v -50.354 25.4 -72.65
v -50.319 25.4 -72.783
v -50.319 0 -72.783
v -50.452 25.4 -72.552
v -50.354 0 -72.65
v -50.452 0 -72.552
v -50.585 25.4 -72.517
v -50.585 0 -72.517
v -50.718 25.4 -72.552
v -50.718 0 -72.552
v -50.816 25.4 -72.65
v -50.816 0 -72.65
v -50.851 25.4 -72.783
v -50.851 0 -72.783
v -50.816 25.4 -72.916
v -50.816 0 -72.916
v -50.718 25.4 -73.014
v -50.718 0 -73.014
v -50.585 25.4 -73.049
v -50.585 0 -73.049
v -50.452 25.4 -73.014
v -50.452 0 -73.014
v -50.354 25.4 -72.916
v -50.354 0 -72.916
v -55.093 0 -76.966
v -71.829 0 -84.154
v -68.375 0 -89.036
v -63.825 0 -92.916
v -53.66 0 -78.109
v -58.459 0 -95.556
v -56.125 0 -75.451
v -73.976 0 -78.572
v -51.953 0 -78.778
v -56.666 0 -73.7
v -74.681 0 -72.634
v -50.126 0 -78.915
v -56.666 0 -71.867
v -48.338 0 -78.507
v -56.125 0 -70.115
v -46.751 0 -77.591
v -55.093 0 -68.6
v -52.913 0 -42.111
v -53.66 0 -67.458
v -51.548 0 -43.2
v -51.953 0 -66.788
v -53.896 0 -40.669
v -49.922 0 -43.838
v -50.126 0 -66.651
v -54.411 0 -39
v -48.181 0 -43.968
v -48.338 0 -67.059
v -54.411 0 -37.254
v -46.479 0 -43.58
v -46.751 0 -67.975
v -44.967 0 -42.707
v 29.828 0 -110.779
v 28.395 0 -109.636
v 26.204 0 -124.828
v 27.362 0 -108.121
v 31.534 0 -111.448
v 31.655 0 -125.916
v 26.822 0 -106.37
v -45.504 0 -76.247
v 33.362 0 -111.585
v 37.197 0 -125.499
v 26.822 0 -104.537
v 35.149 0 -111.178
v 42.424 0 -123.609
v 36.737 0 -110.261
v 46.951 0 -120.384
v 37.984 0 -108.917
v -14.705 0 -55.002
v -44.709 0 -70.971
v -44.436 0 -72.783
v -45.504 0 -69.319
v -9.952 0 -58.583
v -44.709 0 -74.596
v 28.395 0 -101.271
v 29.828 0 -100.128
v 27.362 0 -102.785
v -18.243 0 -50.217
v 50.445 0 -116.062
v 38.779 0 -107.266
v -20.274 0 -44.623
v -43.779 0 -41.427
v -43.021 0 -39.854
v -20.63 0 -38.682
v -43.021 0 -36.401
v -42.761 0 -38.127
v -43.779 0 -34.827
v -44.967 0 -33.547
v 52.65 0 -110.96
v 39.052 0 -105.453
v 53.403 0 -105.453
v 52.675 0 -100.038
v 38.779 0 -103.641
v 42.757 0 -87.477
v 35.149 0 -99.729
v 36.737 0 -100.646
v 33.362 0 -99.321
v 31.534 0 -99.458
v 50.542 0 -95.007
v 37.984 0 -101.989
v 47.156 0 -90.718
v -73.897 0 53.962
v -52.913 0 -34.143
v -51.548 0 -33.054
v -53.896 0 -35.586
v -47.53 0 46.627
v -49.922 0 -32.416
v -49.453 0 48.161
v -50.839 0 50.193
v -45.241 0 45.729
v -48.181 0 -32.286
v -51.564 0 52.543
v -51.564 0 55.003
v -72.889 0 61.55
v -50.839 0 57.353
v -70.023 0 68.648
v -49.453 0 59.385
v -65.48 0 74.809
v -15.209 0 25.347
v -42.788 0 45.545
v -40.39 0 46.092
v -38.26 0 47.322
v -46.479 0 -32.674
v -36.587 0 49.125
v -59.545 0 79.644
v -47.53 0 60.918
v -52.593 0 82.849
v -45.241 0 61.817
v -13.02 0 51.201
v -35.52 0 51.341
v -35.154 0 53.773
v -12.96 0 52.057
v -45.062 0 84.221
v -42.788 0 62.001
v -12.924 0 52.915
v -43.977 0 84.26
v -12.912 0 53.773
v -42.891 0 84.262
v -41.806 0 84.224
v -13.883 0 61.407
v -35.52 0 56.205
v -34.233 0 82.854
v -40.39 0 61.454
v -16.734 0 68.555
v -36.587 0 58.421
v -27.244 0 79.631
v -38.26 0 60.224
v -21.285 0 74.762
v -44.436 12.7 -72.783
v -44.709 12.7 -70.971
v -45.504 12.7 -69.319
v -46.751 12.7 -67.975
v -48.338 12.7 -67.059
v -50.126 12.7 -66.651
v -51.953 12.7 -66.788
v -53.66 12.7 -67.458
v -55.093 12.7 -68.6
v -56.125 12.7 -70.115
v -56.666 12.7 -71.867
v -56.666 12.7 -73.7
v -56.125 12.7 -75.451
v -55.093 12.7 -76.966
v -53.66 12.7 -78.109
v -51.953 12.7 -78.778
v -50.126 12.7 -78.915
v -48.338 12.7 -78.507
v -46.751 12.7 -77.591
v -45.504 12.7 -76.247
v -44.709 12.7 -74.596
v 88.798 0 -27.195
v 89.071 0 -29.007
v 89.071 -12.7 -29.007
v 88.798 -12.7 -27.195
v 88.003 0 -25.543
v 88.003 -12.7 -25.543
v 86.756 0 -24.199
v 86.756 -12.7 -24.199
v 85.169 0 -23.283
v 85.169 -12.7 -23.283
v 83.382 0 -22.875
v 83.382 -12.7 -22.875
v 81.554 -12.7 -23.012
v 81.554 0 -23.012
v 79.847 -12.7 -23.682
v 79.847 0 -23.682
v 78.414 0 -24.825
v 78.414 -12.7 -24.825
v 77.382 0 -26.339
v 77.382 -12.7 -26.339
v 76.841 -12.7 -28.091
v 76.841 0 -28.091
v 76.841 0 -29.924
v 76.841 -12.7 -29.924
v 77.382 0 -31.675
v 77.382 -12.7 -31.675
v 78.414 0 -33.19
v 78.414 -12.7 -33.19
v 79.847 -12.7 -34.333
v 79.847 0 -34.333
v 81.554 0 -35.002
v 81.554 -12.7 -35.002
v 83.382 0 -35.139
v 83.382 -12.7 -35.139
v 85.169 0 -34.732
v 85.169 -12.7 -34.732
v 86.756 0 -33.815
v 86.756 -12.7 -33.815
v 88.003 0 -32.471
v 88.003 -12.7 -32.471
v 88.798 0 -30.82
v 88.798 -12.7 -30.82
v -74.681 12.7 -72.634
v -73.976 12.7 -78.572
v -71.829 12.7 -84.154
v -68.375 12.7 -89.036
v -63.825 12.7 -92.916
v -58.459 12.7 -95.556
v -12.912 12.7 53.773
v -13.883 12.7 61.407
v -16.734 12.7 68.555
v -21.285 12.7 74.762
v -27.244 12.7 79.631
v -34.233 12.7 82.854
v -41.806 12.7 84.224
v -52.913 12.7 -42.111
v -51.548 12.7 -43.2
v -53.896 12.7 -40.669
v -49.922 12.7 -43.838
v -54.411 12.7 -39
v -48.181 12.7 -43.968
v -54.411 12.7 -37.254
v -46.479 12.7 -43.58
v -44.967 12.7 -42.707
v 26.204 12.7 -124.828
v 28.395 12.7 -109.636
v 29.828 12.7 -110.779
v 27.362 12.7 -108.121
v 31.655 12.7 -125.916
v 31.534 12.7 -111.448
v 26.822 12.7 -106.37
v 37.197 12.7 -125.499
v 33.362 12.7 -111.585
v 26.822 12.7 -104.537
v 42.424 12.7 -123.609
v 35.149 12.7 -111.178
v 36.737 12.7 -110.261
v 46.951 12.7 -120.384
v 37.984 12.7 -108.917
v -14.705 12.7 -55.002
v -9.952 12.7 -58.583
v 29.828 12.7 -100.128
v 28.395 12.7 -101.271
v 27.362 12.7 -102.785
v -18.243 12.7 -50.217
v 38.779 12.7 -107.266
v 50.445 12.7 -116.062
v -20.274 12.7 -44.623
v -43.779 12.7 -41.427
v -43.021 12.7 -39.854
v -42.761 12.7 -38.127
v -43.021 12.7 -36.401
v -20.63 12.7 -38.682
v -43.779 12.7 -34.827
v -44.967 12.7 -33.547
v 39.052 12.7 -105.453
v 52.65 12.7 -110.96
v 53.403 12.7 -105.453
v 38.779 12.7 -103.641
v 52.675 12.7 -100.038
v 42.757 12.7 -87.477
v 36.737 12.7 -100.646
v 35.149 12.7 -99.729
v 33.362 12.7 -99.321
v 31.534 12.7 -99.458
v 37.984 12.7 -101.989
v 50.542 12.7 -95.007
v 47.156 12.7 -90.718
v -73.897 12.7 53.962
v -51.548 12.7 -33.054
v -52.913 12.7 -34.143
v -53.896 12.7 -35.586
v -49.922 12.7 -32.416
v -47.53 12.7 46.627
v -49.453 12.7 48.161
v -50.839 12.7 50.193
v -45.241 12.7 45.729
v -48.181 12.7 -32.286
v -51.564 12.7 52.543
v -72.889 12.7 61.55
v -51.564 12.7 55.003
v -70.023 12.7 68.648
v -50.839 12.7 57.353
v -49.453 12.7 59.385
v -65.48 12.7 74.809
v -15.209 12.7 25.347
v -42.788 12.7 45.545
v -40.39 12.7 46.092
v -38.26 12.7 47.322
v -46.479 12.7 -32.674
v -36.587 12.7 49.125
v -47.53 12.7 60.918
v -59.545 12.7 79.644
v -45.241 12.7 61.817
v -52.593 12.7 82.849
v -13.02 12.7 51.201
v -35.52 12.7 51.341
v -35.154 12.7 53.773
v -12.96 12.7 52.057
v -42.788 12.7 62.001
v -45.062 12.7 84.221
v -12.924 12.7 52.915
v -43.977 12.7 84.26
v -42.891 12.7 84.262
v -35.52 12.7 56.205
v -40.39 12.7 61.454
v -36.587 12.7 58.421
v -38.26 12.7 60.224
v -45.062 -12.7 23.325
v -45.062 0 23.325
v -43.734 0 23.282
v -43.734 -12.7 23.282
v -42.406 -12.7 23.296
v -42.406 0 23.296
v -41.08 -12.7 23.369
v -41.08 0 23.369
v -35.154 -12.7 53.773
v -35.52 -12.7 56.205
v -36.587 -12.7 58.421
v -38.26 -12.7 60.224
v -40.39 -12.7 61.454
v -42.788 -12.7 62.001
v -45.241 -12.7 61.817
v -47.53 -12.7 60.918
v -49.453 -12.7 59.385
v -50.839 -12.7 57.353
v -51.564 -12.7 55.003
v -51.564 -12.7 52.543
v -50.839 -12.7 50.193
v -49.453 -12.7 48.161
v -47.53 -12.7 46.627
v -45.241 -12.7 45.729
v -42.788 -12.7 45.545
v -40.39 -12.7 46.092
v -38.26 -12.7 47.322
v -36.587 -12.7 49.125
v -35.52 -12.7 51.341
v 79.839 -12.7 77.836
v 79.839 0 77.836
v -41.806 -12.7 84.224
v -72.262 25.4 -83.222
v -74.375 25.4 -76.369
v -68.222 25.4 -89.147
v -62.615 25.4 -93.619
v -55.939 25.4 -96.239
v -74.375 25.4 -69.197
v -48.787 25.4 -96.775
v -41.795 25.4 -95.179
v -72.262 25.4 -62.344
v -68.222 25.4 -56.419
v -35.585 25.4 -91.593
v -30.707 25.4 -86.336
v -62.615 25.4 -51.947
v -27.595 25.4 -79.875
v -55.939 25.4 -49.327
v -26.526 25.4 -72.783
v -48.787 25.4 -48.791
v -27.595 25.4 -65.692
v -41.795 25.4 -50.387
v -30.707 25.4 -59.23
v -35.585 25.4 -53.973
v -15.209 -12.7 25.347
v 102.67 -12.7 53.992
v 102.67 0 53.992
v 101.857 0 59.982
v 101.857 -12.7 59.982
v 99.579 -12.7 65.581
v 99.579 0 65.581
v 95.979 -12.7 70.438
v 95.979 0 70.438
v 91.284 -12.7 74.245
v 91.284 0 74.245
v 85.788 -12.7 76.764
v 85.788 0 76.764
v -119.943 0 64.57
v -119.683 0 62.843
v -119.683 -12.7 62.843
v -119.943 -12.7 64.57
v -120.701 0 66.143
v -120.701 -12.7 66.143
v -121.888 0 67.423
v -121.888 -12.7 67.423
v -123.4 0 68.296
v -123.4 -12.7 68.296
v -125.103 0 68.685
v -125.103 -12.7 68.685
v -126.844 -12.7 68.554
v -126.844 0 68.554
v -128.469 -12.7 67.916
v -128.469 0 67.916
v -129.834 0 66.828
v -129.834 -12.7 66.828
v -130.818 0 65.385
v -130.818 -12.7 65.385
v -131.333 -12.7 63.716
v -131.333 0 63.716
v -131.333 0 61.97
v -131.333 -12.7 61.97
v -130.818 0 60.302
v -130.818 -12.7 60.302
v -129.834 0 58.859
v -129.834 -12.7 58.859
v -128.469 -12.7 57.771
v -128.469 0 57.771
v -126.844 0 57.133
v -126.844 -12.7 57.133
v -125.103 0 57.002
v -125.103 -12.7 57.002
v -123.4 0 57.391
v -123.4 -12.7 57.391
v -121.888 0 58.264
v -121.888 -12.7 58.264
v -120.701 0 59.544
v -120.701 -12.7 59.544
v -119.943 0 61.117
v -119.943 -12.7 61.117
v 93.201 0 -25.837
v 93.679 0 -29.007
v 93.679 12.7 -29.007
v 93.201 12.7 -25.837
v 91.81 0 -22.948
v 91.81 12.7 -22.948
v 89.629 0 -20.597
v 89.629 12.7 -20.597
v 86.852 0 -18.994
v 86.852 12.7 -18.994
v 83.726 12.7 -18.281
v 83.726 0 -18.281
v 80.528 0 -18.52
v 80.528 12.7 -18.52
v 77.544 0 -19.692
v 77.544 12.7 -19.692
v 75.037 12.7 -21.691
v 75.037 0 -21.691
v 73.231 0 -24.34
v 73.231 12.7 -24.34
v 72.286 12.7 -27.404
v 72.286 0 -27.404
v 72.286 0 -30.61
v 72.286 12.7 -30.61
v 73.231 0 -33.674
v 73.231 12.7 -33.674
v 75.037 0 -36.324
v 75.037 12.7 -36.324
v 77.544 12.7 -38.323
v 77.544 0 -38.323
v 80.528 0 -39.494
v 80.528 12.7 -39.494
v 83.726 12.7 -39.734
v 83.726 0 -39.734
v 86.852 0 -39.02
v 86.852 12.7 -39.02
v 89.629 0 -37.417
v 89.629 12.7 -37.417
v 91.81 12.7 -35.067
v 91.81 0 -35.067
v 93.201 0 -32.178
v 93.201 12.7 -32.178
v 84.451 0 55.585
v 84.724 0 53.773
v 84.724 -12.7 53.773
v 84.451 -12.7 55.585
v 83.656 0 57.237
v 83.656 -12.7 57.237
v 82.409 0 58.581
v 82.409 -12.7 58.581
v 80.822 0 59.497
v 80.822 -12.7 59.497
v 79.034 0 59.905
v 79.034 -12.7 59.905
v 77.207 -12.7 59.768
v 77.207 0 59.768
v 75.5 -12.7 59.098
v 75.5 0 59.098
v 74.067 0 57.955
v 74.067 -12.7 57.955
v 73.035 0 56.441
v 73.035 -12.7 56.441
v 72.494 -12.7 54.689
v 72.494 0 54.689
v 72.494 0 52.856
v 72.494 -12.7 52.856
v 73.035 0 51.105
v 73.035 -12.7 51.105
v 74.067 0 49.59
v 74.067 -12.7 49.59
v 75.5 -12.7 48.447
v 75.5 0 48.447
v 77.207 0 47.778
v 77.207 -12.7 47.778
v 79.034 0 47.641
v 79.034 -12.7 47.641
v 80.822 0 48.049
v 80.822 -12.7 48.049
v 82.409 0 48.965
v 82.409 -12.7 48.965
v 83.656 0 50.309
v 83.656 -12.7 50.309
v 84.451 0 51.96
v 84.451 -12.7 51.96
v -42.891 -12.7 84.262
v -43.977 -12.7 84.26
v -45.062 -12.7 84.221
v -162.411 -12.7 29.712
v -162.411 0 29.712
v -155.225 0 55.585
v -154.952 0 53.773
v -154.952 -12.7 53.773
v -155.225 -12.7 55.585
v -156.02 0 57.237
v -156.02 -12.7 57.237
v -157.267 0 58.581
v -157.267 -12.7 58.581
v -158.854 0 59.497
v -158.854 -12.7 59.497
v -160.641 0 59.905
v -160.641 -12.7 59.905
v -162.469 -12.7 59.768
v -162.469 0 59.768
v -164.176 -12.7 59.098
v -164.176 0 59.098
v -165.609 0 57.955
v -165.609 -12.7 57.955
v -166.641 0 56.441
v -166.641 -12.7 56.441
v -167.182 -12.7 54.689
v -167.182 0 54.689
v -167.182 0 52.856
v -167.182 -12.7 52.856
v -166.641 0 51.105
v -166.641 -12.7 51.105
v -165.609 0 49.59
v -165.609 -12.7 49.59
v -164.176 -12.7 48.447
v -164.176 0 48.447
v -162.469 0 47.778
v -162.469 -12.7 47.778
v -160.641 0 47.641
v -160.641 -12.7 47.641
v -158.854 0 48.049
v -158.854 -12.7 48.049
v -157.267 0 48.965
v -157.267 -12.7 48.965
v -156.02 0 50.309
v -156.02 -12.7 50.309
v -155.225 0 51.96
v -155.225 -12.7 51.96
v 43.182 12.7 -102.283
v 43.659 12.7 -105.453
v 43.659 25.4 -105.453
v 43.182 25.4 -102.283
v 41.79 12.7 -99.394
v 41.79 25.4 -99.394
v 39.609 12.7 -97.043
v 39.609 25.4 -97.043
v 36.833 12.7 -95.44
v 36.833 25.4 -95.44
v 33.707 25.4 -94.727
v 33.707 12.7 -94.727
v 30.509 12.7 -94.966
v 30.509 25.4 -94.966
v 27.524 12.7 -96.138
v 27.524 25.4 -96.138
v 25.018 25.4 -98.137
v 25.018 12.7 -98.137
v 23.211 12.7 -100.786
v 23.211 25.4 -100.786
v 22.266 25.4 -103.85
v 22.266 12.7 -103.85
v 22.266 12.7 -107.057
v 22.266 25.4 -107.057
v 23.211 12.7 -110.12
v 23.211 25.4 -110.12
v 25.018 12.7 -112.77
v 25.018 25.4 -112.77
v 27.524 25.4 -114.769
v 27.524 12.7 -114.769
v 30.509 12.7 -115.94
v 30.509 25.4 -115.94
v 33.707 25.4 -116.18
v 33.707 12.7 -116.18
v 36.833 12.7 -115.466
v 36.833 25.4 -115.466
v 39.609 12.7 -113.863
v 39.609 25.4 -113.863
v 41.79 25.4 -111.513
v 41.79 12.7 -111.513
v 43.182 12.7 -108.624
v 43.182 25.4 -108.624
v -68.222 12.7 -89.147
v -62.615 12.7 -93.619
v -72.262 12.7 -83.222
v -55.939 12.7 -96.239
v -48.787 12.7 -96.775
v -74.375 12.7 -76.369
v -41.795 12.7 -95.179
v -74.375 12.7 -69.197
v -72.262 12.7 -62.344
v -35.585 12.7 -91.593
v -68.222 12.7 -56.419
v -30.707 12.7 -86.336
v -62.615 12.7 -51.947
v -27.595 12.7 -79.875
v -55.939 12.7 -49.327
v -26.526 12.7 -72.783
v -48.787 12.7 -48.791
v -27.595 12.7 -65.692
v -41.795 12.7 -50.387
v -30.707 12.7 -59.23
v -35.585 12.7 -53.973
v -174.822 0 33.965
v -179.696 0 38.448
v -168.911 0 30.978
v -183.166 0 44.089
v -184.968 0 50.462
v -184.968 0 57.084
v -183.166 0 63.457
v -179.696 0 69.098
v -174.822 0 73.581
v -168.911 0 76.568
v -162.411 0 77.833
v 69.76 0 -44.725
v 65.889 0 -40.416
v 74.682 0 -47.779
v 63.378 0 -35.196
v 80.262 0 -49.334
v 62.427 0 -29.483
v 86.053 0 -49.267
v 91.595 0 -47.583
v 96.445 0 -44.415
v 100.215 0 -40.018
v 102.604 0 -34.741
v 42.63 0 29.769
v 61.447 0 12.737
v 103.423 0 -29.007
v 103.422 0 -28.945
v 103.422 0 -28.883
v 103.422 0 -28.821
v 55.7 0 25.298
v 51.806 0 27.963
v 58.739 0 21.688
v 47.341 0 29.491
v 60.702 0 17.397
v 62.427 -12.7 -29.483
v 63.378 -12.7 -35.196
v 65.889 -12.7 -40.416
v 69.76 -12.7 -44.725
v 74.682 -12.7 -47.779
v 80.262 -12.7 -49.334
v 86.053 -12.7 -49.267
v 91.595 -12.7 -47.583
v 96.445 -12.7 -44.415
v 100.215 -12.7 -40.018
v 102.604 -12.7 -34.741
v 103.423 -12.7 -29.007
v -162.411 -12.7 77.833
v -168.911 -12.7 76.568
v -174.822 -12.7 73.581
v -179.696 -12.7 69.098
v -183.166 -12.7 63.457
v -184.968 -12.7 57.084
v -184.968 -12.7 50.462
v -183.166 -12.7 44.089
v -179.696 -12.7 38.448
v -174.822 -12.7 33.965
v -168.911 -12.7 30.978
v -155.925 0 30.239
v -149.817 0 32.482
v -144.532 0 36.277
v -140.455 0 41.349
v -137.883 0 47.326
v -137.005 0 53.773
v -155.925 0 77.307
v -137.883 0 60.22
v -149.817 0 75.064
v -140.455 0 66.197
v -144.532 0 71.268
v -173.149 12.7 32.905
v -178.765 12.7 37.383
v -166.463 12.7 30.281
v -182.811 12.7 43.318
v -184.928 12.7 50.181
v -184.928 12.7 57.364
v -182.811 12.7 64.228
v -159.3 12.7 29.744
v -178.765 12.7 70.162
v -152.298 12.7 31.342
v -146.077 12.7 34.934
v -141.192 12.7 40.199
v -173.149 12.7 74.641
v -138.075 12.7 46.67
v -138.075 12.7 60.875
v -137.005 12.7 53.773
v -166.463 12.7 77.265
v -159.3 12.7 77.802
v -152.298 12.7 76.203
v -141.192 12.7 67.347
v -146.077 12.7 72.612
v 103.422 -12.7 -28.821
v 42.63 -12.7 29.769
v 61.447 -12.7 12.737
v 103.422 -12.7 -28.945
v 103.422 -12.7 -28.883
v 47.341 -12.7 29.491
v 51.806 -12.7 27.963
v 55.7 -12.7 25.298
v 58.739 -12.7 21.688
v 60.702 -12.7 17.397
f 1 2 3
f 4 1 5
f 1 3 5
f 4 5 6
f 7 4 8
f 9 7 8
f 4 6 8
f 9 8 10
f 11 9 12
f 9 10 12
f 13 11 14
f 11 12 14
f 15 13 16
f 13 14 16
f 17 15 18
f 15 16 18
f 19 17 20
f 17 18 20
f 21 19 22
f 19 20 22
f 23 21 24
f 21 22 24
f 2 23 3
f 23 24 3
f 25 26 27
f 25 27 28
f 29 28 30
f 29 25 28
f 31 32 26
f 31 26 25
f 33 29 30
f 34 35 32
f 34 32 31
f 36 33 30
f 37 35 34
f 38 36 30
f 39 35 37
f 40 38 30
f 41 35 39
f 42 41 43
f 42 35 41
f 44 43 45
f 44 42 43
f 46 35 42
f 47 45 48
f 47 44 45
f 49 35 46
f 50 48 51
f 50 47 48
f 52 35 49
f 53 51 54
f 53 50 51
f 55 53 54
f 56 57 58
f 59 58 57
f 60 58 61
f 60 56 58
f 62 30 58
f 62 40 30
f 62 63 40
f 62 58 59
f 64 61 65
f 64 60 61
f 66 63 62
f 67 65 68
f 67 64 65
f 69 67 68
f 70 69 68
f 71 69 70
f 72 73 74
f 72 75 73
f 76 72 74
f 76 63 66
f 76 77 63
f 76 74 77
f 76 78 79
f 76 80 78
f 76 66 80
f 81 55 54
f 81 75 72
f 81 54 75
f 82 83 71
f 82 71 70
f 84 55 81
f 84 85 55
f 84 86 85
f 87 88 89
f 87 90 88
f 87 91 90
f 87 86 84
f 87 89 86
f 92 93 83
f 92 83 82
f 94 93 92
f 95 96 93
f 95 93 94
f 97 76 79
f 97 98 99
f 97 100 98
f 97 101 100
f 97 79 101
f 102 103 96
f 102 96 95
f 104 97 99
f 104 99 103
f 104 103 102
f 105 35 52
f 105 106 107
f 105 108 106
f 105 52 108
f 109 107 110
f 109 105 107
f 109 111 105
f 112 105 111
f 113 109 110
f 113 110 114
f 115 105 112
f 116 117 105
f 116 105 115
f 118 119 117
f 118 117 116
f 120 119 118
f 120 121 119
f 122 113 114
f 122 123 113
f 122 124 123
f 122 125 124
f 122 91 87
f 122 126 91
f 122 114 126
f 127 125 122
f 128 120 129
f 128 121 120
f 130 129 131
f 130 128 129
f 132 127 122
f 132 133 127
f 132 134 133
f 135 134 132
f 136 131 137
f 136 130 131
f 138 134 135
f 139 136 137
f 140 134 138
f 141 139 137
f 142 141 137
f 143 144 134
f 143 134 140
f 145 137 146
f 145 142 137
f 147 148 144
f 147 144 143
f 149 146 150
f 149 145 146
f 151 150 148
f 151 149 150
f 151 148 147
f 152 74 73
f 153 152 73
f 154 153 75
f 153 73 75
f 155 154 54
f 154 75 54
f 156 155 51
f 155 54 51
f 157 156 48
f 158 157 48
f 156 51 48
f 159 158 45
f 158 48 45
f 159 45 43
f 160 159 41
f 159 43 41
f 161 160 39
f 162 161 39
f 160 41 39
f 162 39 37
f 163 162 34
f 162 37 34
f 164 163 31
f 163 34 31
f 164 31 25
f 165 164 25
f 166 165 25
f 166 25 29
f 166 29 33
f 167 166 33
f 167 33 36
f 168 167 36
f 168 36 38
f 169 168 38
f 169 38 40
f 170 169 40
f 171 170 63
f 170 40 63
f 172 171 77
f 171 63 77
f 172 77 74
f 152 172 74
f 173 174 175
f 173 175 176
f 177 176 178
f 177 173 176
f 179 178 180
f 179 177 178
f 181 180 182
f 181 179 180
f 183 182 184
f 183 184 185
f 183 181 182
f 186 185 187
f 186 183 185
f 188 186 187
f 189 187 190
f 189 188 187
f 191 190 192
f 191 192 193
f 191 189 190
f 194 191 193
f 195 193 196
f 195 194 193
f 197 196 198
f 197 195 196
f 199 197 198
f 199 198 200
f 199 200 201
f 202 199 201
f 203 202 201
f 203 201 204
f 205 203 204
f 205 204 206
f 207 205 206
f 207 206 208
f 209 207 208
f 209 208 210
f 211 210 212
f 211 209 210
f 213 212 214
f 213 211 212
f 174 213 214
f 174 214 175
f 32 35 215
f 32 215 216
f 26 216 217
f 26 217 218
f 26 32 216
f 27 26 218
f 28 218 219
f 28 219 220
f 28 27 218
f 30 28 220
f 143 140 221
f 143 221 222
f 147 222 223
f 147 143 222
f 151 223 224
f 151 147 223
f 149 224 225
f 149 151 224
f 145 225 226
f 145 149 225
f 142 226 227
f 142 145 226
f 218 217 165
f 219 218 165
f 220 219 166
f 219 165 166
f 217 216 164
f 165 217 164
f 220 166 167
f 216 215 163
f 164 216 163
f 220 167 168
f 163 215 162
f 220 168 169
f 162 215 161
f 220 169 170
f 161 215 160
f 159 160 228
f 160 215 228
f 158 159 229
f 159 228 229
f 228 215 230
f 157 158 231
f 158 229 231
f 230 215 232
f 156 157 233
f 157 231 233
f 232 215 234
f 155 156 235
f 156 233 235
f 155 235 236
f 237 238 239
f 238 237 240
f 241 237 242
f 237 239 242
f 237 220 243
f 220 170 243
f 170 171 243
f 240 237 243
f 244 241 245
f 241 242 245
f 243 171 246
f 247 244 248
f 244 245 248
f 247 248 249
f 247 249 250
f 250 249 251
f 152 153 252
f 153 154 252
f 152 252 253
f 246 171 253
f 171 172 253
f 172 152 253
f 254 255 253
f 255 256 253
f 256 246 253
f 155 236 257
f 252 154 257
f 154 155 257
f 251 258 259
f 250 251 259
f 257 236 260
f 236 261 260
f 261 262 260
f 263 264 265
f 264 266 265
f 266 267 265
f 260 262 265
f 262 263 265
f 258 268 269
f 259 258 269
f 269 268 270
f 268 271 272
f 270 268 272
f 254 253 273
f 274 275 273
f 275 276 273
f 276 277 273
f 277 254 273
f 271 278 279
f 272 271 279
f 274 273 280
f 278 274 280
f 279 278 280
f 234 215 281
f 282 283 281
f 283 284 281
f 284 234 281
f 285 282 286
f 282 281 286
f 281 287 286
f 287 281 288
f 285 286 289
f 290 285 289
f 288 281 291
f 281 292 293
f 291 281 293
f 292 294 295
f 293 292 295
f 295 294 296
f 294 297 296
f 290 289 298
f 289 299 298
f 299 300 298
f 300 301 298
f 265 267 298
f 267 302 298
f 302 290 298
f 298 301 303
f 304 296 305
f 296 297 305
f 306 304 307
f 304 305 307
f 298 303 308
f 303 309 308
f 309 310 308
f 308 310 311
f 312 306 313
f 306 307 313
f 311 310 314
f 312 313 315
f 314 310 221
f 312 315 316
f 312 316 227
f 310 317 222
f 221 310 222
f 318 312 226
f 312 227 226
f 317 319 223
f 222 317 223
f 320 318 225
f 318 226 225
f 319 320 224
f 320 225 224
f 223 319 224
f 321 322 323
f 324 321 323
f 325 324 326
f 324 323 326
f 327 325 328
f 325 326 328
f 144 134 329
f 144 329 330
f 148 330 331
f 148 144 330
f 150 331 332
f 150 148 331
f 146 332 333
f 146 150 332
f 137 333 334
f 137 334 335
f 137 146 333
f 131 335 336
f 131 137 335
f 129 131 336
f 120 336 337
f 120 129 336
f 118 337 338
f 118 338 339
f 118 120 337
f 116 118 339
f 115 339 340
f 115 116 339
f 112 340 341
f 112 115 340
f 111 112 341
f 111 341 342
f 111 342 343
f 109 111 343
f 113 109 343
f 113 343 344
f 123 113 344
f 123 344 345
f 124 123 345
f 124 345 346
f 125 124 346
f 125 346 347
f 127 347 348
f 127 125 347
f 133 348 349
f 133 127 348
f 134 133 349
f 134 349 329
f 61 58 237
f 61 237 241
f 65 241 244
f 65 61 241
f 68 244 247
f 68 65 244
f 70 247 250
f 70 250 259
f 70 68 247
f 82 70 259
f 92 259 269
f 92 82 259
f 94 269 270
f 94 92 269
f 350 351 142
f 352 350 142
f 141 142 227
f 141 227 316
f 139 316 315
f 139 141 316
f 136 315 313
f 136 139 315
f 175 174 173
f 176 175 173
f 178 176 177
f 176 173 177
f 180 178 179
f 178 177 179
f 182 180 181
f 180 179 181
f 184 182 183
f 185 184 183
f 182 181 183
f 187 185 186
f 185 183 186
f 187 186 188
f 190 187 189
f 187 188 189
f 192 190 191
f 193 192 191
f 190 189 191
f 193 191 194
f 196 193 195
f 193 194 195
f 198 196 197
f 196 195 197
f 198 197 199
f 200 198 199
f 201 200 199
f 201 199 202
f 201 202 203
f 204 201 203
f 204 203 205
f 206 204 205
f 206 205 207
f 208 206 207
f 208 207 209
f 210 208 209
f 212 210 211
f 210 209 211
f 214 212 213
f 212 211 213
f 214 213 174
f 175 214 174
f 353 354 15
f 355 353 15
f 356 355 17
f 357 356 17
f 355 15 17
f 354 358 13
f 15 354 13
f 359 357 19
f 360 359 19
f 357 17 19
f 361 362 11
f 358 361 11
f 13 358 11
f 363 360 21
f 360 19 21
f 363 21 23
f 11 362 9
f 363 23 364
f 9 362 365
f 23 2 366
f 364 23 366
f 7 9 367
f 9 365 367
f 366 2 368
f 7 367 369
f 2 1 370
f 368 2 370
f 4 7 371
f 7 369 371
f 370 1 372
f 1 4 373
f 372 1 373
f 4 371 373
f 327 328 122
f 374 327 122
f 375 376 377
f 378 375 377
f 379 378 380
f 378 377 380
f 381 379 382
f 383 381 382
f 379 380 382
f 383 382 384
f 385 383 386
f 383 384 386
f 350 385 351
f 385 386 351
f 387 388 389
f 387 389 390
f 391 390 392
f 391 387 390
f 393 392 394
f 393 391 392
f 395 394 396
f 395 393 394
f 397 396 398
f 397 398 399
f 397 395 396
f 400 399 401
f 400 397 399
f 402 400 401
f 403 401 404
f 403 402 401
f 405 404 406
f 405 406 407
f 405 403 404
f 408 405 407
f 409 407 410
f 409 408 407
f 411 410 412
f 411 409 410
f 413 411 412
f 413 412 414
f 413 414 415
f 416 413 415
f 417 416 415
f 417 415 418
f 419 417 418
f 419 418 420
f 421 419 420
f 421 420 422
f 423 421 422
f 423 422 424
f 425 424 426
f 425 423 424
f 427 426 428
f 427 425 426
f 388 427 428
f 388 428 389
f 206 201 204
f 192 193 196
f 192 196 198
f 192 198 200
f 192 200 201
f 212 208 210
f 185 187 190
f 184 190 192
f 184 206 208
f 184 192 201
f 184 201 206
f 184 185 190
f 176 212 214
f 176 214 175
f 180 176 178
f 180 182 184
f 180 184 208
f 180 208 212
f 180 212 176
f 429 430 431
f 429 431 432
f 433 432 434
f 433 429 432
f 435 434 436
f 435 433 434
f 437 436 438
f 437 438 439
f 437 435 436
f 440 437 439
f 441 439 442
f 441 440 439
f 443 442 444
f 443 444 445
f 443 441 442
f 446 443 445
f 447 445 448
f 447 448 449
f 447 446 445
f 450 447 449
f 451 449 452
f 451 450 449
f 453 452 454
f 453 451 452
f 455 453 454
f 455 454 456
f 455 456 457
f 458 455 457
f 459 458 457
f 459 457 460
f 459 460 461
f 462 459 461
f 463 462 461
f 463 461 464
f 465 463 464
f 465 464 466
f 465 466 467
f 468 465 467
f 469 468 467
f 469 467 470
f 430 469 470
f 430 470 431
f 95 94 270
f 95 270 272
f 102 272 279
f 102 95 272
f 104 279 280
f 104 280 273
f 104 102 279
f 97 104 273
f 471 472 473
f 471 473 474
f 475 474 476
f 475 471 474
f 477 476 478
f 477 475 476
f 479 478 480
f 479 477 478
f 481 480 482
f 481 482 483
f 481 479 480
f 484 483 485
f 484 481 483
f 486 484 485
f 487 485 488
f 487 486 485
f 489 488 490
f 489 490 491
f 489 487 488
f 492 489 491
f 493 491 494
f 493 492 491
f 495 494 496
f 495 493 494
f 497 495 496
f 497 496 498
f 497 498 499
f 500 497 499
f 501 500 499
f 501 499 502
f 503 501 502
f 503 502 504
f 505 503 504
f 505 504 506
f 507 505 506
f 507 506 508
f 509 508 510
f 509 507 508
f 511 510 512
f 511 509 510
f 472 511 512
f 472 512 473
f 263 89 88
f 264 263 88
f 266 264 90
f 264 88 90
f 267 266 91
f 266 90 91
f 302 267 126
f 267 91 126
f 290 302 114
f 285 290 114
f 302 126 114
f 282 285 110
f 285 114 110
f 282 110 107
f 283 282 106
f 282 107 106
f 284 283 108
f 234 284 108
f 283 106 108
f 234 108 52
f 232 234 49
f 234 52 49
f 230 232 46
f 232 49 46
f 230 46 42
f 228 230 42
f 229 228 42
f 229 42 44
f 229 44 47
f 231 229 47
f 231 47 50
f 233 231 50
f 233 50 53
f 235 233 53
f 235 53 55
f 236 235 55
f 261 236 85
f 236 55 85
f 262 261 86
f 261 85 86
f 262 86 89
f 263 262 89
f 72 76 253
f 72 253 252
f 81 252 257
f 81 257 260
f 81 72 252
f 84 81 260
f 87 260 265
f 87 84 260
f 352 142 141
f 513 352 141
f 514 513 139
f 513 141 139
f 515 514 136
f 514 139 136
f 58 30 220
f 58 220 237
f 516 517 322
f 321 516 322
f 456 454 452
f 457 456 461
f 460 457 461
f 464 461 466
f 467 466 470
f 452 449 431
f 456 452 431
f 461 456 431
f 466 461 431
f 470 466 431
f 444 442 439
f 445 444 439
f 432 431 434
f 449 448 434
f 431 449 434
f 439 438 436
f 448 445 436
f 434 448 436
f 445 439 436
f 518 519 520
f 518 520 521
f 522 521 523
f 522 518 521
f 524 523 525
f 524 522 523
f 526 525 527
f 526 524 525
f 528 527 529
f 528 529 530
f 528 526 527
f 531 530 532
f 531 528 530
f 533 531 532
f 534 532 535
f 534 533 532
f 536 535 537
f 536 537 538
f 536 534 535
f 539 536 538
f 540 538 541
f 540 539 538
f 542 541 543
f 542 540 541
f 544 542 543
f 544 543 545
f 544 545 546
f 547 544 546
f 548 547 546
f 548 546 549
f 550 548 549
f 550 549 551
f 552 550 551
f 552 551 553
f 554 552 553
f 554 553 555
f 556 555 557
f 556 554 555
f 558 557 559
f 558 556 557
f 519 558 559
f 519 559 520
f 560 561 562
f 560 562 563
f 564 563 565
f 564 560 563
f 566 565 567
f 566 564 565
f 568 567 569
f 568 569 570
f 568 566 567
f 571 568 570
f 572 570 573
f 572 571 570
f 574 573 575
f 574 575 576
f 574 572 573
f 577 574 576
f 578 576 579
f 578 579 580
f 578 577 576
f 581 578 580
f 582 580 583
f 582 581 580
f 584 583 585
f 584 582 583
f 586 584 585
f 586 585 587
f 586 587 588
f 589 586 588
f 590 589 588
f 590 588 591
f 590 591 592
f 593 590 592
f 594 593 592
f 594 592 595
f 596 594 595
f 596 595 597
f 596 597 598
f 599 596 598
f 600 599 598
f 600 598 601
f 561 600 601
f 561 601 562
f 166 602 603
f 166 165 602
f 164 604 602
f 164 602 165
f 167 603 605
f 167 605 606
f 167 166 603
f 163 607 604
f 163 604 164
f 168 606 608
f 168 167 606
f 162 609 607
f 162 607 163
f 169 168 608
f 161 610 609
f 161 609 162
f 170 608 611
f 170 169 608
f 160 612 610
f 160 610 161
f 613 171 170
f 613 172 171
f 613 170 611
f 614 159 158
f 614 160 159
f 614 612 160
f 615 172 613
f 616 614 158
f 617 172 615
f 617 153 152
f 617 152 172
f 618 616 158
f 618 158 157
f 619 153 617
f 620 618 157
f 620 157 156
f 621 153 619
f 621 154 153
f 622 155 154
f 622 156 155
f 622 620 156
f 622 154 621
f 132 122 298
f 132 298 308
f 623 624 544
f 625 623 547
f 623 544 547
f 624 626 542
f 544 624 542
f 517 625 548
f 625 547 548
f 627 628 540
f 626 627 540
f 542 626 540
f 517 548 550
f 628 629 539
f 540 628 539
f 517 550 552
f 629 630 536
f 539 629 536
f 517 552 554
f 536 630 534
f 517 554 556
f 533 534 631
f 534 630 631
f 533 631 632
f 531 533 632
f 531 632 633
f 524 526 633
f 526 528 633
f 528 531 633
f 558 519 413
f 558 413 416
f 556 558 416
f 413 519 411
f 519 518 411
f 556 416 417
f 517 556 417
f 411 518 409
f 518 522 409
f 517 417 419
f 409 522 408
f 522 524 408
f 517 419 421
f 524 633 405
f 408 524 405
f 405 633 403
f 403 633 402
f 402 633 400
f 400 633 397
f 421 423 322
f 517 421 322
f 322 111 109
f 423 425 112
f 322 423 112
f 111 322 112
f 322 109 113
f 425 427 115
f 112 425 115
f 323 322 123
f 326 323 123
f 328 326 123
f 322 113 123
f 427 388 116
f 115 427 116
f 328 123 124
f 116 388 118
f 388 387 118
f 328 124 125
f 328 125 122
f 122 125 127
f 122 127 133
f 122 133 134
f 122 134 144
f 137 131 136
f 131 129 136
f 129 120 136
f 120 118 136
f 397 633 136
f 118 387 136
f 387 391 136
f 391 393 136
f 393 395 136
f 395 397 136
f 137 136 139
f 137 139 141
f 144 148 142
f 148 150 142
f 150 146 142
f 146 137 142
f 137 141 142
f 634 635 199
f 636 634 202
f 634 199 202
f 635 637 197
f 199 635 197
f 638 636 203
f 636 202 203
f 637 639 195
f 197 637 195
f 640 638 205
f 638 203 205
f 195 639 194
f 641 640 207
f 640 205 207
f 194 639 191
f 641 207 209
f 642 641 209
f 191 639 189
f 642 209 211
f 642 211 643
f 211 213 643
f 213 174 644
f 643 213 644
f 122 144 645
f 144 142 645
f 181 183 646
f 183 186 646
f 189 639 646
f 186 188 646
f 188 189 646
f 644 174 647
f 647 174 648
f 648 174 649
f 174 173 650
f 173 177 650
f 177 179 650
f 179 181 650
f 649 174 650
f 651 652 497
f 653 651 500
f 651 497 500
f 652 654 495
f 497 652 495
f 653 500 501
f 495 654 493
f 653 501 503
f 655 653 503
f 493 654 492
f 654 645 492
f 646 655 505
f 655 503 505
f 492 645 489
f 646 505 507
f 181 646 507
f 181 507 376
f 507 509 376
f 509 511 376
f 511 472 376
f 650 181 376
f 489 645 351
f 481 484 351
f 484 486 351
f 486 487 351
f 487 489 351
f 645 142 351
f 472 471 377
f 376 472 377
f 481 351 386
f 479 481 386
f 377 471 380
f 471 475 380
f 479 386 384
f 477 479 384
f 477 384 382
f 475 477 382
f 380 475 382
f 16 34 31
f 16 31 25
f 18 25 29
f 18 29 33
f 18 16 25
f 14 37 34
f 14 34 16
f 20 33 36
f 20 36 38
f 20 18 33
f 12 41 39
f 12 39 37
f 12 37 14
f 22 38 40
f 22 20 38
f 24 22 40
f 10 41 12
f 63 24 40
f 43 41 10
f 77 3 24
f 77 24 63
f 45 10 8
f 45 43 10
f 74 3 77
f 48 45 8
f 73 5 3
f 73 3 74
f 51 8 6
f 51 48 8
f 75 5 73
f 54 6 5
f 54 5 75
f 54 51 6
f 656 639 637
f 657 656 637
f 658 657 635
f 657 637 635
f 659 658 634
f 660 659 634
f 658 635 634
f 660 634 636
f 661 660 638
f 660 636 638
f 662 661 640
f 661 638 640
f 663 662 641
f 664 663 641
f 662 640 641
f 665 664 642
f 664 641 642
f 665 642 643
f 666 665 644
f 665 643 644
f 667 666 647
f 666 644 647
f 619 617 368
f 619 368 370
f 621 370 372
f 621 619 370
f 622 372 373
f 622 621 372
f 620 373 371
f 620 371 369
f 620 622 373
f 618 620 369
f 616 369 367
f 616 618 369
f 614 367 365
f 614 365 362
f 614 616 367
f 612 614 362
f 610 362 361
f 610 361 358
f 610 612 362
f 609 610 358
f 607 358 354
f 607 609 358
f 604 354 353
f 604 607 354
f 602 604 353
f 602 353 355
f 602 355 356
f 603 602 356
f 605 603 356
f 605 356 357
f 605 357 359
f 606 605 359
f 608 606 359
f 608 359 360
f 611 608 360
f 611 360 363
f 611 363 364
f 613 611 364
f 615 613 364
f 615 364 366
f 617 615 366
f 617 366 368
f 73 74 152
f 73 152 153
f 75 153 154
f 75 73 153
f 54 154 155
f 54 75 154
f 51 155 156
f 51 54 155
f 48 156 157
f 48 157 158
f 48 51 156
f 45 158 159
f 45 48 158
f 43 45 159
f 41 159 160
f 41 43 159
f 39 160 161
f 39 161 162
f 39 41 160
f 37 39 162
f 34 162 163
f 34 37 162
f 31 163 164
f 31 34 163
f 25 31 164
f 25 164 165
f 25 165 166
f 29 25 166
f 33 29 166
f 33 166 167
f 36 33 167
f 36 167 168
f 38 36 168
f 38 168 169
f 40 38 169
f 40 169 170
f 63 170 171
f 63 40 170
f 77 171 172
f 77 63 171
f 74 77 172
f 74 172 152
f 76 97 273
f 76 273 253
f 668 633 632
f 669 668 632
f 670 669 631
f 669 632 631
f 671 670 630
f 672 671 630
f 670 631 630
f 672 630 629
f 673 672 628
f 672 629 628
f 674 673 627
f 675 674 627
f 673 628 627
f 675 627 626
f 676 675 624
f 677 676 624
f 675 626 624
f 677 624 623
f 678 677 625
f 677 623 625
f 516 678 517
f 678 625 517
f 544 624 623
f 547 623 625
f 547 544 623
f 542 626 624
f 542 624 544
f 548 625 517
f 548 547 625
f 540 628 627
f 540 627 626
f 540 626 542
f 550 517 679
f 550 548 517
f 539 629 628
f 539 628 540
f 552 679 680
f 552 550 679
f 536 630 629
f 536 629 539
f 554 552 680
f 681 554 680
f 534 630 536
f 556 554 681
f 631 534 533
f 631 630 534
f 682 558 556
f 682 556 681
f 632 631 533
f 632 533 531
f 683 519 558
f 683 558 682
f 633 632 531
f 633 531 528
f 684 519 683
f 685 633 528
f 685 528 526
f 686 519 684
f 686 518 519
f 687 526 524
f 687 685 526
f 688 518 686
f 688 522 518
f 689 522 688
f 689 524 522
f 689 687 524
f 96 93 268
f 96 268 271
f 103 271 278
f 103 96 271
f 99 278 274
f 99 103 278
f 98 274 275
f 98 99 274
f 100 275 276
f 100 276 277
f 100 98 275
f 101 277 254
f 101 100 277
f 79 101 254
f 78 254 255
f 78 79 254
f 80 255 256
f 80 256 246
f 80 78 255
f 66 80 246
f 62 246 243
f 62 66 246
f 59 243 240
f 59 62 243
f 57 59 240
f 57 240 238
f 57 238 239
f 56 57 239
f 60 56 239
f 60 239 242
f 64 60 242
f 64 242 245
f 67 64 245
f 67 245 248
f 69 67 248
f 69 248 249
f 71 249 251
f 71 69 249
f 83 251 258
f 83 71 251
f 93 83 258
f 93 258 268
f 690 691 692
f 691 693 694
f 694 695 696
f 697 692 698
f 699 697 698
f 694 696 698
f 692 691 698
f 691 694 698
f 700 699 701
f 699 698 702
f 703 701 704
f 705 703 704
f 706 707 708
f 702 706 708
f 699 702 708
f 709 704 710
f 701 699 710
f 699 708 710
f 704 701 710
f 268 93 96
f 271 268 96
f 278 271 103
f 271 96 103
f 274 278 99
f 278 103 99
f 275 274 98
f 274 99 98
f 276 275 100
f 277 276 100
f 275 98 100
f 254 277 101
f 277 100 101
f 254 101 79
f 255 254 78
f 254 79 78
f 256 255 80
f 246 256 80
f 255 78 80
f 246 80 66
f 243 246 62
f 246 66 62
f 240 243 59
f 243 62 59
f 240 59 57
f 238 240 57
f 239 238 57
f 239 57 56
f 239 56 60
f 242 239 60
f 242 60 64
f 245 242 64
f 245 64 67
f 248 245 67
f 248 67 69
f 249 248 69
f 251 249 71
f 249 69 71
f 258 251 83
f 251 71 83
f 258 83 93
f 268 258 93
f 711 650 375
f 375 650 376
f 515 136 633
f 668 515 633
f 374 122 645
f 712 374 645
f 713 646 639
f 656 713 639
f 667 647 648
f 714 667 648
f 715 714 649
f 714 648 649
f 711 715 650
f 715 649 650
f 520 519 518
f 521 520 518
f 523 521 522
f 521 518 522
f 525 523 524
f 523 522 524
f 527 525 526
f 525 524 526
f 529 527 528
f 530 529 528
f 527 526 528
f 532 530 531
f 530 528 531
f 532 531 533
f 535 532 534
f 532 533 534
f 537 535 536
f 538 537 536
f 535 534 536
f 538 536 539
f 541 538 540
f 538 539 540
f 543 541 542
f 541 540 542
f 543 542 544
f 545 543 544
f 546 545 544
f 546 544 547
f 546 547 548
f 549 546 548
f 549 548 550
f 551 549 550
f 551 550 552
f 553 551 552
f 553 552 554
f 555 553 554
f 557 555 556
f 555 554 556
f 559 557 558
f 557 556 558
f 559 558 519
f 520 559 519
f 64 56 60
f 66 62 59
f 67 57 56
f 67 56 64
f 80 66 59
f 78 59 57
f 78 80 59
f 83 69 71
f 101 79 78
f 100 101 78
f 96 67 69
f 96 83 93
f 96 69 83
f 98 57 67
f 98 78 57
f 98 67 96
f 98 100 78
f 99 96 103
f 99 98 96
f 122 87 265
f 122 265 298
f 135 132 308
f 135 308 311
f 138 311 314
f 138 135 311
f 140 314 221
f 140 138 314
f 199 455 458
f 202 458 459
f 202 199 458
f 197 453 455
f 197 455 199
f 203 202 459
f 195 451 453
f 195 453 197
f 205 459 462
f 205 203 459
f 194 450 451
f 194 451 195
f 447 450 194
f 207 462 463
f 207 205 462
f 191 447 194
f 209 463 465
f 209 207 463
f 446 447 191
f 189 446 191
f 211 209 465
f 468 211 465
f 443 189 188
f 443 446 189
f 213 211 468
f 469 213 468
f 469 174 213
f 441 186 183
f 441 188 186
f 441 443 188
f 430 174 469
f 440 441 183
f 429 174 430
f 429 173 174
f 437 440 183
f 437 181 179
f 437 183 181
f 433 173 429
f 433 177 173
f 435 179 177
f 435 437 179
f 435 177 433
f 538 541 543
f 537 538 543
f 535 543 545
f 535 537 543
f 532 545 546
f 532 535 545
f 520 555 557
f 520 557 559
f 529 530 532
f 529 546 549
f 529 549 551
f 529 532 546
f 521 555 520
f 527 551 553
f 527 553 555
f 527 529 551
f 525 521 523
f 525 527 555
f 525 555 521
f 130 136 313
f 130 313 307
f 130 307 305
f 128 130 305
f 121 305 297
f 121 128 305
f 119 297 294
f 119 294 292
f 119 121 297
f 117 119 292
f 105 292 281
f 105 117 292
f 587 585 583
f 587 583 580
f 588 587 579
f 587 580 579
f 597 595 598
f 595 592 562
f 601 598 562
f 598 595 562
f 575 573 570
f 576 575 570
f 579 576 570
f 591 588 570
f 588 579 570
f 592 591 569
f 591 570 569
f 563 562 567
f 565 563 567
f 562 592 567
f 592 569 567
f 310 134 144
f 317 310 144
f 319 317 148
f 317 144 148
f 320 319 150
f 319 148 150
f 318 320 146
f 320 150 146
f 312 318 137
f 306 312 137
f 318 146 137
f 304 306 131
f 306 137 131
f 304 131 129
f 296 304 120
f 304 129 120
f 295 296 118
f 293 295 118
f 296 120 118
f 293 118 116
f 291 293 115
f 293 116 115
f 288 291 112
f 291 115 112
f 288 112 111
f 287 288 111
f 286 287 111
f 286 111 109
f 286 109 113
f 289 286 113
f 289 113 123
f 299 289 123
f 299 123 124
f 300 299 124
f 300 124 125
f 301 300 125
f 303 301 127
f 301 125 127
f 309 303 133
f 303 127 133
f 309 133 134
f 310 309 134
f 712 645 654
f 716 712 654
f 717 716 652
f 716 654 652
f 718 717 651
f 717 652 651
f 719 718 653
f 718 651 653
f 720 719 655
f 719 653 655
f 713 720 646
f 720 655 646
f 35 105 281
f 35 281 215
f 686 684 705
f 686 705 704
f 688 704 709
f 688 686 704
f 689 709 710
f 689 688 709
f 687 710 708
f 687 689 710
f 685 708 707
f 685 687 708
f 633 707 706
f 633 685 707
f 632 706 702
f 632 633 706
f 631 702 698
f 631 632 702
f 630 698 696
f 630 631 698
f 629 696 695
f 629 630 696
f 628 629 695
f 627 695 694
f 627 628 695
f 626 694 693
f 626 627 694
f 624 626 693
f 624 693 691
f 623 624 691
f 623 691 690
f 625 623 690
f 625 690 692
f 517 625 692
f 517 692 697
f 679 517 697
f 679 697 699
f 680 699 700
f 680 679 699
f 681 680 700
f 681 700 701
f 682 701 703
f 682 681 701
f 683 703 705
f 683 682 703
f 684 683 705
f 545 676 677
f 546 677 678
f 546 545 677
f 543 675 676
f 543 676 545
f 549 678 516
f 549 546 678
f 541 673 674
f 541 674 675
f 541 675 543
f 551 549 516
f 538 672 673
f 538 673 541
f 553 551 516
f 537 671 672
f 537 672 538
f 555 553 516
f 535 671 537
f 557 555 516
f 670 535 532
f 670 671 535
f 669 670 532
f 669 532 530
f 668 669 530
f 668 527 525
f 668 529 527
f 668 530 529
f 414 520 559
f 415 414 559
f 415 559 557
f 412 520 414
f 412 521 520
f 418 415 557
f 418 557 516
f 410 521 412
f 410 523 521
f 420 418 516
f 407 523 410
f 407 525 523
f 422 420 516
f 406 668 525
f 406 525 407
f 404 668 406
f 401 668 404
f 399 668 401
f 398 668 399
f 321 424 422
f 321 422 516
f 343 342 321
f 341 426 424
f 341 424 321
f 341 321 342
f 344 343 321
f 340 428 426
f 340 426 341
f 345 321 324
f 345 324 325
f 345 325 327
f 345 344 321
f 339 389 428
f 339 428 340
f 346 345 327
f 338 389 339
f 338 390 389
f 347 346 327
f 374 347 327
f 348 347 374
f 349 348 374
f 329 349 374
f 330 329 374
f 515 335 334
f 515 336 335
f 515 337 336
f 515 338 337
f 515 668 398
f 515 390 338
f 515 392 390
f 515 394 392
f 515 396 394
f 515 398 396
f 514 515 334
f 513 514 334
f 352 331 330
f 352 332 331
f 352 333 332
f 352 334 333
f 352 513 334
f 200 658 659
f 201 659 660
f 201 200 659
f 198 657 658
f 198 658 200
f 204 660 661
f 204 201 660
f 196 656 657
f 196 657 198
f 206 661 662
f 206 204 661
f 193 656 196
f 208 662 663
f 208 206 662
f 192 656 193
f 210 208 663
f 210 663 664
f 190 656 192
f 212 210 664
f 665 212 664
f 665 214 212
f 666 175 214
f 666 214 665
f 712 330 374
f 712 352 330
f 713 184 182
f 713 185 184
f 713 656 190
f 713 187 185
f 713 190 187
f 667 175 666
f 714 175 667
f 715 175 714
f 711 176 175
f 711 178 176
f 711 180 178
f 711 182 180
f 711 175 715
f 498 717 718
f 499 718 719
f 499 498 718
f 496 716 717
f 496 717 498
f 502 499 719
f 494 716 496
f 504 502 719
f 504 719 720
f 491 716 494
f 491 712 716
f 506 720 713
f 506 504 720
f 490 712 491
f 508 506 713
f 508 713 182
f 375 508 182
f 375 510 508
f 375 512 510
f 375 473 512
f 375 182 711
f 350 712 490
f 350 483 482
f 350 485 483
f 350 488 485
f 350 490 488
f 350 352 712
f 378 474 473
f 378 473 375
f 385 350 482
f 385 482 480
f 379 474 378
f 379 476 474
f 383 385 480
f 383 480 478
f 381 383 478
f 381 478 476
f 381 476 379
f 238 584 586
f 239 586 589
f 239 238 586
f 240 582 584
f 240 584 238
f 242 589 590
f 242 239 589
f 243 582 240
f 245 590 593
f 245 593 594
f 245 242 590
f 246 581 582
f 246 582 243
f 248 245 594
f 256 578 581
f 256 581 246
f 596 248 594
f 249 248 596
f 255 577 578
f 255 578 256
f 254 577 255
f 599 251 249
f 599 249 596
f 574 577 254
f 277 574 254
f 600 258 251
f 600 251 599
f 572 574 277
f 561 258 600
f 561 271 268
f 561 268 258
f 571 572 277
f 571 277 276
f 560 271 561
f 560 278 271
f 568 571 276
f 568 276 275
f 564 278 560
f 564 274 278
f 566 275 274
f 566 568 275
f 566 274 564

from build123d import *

# Parameters (mm, degrees)
F0_R     = 6.1493367897
F0_R_2   = 5.8576786547
F0_R_3   = 8.2510252631
F1_DEPTH = 12.7
F2_DEPTH = 12.7
F3_R     = 10.7566179169
F5_DEPTH = 25.4
F3_R_2   = 24.0961882632
F4_R     = 24.0590637796
F4_R_2   = 0.2663452523
F4_R_3   = 10.7566179169


with BuildPart() as f1:
    # F0 (on Front) → F1 (new body)
    with BuildSketch(Plane.XZ):
        with BuildLine():
            ThreePointArc((-137.004724496, 53.7728478672), (-144.5318286506, 71.2683255862), (-162.4105469667, 77.8334203262))
            ThreePointArc((-162.4105469667, 77.8334203262), (-185.1971010223, 53.7728478672), (-162.4105469667, 29.7122754082))
            ThreePointArc((-162.4105469667, 29.7122754082), (-144.5318286506, 36.2773701482), (-137.004724496, 53.7728478672))
        make_face()
        with Locations((-161.1009127591, 53.7728478672)):
            Circle(F0_R, mode=Mode.SUBTRACT)
        with BuildLine():
            ThreePointArc((-73.8970993097, 53.9616213386), (-65.4796718147, 74.8089623918), (-45.0619767979, 84.2207871257))
            Line((-45.0619767979, 84.2207871257), (-162.4105469667, 77.8334203262))
            ThreePointArc((-162.4105469667, 77.8334203262), (-144.5318286506, 71.2683255862), (-137.004724496, 53.7728478672))
            ThreePointArc((-137.004724496, 53.7728478672), (-144.5318286506, 36.2773701482), (-162.4105469667, 29.7122754082))
            Line((-162.4105469667, 29.7122754082), (-74.0769888087, 24.9042165128))
            Line((-74.0769888087, 24.9042165128), (-73.8970993097, 53.9616213386))
        make_face()
        with Locations((-125.5404559068, 62.8434497782)):
            Circle(F0_R_2, mode=Mode.SUBTRACT)
        with BuildLine():
            ThreePointArc((-45.0619767979, 23.3249086087), (-65.6094773456, 32.873796427), (-73.8970993097, 53.9616213386))
            Line((-73.8970993097, 53.9616213386), (-74.0769888087, 24.9042165128))
            Line((-74.0769888087, 24.9042165128), (-45.0619767979, 23.3249086087))
        make_face()
        with BuildLine():
            ThreePointArc((-13.0203492827, 51.2005935197), (-12.9388471647, 52.4855731298), (-12.9116636365, 53.7728478672))
            ThreePointArc((-12.9116636365, 53.7728478672), (-21.2847140662, 74.7616793609), (-41.8055673522, 84.2238990469))
            ThreePointArc((-41.8055673522, 84.2238990469), (-43.4338136458, 84.2658439437), (-45.0619767979, 84.2207871257))
            ThreePointArc((-45.0619767979, 84.2207871257), (-65.4796718147, 74.8089623918), (-73.8970993097, 53.9616213386))
            ThreePointArc((-73.8970993097, 53.9616213386), (-65.6094773456, 32.873796427), (-45.0619767979, 23.3249086087))
            ThreePointArc((-45.0619767979, 23.3249086087), (-43.0702384678, 23.2816718981), (-41.0799276521, 23.368584762))
            ThreePointArc((-41.0799276521, 23.368584762), (-21.9308291165, 32.1234215378), (-13.0203492827, 51.2005935197))
        make_face()
        with Locations((-43.4046736365, 53.7728478672)):
            Circle(F0_R_3, mode=Mode.SUBTRACT)
        with BuildLine():
            Line((-15.2090695609, 25.3467012272), (-13.0203492827, 51.2005935197))
            ThreePointArc((-13.0203492827, 51.2005935197), (-21.9308291165, 32.1234215378), (-41.0799276521, 23.368584762))
            Line((-41.0799276521, 23.368584762), (-15.2090695609, 25.3467012272))
        make_face()
        with BuildLine():
            ThreePointArc((-41.8055673522, 84.2238990469), (-21.2847140662, 74.7616793609), (-12.9116636365, 53.7728478672))
            ThreePointArc((-12.9116636365, 53.7728478672), (-12.9388471647, 52.4855731298), (-13.0203492827, 51.2005935197))
            Line((-13.0203492827, 51.2005935197), (-15.2090695609, 25.3467012272))
            Line((-15.2090695609, 25.3467012272), (42.6304365589, 29.7691784017))
            ThreePointArc((42.6304365589, 29.7691784017), (55.6995392523, 25.2975780046), (61.447394796, 12.7373705236))
            Line((61.447394796, 12.7373705236), (62.4270150936, -29.4827839898))
            ThreePointArc((62.4270150936, -29.4827839898), (82.5912356818, -8.509370566), (103.4217411847, -28.8211873993))
            Line((103.4217411847, -28.8211873993), (102.6701248935, 53.9915381907))
            ThreePointArc((102.6701248935, 53.9915381907), (102.6708691973, 53.8821941548), (102.6711173003, 53.7728478672))
            ThreePointArc((102.6711173003, 53.7728478672), (61.0952932065, 37.1870521358), (79.8385749048, 77.8358794288))
            Line((79.8385749048, 77.8358794288), (-41.8055673522, 84.2238990469))
        make_face()
        with BuildLine():
            ThreePointArc((102.6701248935, 53.9915381907), (95.9791200745, 70.4377938061), (79.8385749048, 77.8358794288))
            ThreePointArc((79.8385749048, 77.8358794288), (61.0952932065, 37.1870521358), (102.6711173003, 53.7728478672))
            ThreePointArc((102.6711173003, 53.7728478672), (102.6708691973, 53.8821941548), (102.6701248935, 53.9915381907))
        make_face()
        with Locations((78.5749290371, 53.7728478672)):
            Circle(F0_R, mode=Mode.SUBTRACT)
        with BuildLine():
            ThreePointArc((103.4225855041, -29.0072446459), (103.4223744232, -28.9142150647), (103.4217411847, -28.8211873993))
            ThreePointArc((103.4217411847, -28.8211873993), (82.5912356818, -8.509370566), (62.4270150936, -29.4827839898))
            ThreePointArc((62.4270150936, -29.4827839898), (83.1598278924, -49.506408842), (103.4225855041, -29.0072446459))
        make_face()
        with Locations((82.9220422244, -29.0072446459)):
            Circle(F0_R, mode=Mode.SUBTRACT)
    extrude(amount=F1_DEPTH)


with BuildPart() as f2:
    # F0 (on Front) → F2 (new body)
    with BuildSketch(Plane.XZ):
        with BuildLine():
            ThreePointArc((-13.0203492827, 51.2005935197), (-12.9388471647, 52.4855731298), (-12.9116636365, 53.7728478672))
            ThreePointArc((-12.9116636365, 53.7728478672), (-21.2847140662, 74.7616793609), (-41.8055673522, 84.2238990469))
            ThreePointArc((-41.8055673522, 84.2238990469), (-43.4338136458, 84.2658439437), (-45.0619767979, 84.2207871257))
            ThreePointArc((-45.0619767979, 84.2207871257), (-65.4796718147, 74.8089623918), (-73.8970993097, 53.9616213386))
            ThreePointArc((-73.8970993097, 53.9616213386), (-65.6094773456, 32.873796427), (-45.0619767979, 23.3249086087))
            ThreePointArc((-45.0619767979, 23.3249086087), (-43.0702384678, 23.2816718981), (-41.0799276521, 23.368584762))
            ThreePointArc((-41.0799276521, 23.368584762), (-21.9308291165, 32.1234215378), (-13.0203492827, 51.2005935197))
        make_face()
        with Locations((-43.4046736365, 53.7728478672)):
            Circle(F0_R_3, mode=Mode.SUBTRACT)
        with BuildLine():
            Line((-15.2090695609, 25.3467012272), (-13.0203492827, 51.2005935197))
            ThreePointArc((-13.0203492827, 51.2005935197), (-21.9308291165, 32.1234215378), (-41.0799276521, 23.368584762))
            Line((-41.0799276521, 23.368584762), (-15.2090695609, 25.3467012272))
        make_face()
        with BuildLine():
            ThreePointArc((-45.0619767979, 23.3249086087), (-65.6094773456, 32.873796427), (-73.8970993097, 53.9616213386))
            Line((-73.8970993097, 53.9616213386), (-74.0769888087, 24.9042165128))
            Line((-74.0769888087, 24.9042165128), (-45.0619767979, 23.3249086087))
        make_face()
        with BuildLine():
            Line((-15.2090695609, 25.3467012272), (-41.0799276521, 23.368584762))
            ThreePointArc((-41.0799276521, 23.368584762), (-43.0702384678, 23.2816718981), (-45.0619767979, 23.3249086087))
            Line((-45.0619767979, 23.3249086087), (-74.0769888087, 24.9042165128))
            Line((-74.0769888087, 24.9042165128), (-74.6808307664, -72.6338849963))
            ThreePointArc((-74.6808307664, -72.6338849963), (-50.5105176005, -48.6869847544), (-26.4889159868, -72.7830575806))
            ThreePointArc((-26.4889159868, -72.7830575806), (-36.6048286441, -92.4090144439), (-58.4589669004, -95.5564757645))
            Line((-58.4589669004, -95.5564757645), (26.2038747484, -124.8284797014))
            ThreePointArc((26.2038747484, -124.8284797014), (14.1603031043, -97.1472253354), (42.75710793, -87.4765368913))
            Line((42.75710793, -87.4765368913), (-9.9518053451, -58.5831569567))
            ThreePointArc((-9.9518053451, -58.5831569567), (-18.2433115483, -50.2168226605), (-20.6295718572, -38.6820757448))
            Line((-20.6295718572, -38.6820757448), (-15.2090695609, 25.3467012272))
        make_face()
        with Locations((-48.6188251285, -38.1271646444)):
            Circle(F0_R_2, mode=Mode.SUBTRACT)
        with BuildLine():
            ThreePointArc((-26.4889159868, -72.7830575806), (-50.5105176005, -48.6869847544), (-74.6808307664, -72.6338849963))
            ThreePointArc((-74.6808307664, -72.6338849963), (-70.2542412355, -86.702516588), (-58.4589669004, -95.5564757645))
            ThreePointArc((-58.4589669004, -95.5564757645), (-36.6048286441, -92.4090144439), (-26.4889159868, -72.7830575806))
        make_face()
        with Locations((-50.58510425, -72.7830575806)):
            Circle(F0_R, mode=Mode.SUBTRACT)
        with BuildLine():
            ThreePointArc((53.4033390474, -105.4533221036), (50.542113041, -95.0069466128), (42.75710793, -87.4765368913))
            ThreePointArc((42.75710793, -87.4765368913), (14.1603031043, -97.1472253354), (26.2038747484, -124.8284797014))
            ThreePointArc((26.2038747484, -124.8284797014), (44.7969278184, -122.1506840966), (53.4033390474, -105.4533221036))
        make_face()
        with Locations((32.9027957677, -105.4533221036)):
            Circle(F0_R, mode=Mode.SUBTRACT)
    extrude(amount=-F2_DEPTH)


with BuildPart() as f5:
    # F3 (on face) → F5 (new body)
    with BuildSketch(Plane.XZ.offset(12.7)):
        with Locations((82.9220422244, -29.0072446459)):
            Circle(F3_R)
    extrude(amount=-F5_DEPTH)

    # F6: cut F1, F2
    add(f1.part, mode=Mode.SUBTRACT)
    add(f2.part, mode=Mode.SUBTRACT)


with BuildPart() as f5b:
    # F3 (on face) → F5, piece 2 (new body)
    with BuildSketch(Plane.XZ.offset(12.7)):
        with Locations((-161.1009127591, 53.7728478672)):
            Circle(F3_R_2)
    extrude(amount=-F5_DEPTH)

    # F6: cut F1, F2
    add(f1.part, mode=Mode.SUBTRACT)
    add(f2.part, mode=Mode.SUBTRACT)


with BuildPart() as f5c:
    # F4 (on face) → F5, piece 3 (new body)
    with BuildSketch(Plane.XZ):
        with Locations((-50.58510425, -72.7830575806)):
            Circle(F4_R)
        with Locations((-50.58510425, -72.7830575806)):
            Circle(F4_R_2, mode=Mode.SUBTRACT)
    extrude(amount=-F5_DEPTH)

    # F6: cut F1, F2
    add(f1.part, mode=Mode.SUBTRACT)
    add(f2.part, mode=Mode.SUBTRACT)


with BuildPart() as f5d:
    # F4 (on face) → F5, piece 4 (new body)
    with BuildSketch(Plane.XZ):
        with Locations((32.9027957677, -105.4533221036)):
            Circle(F4_R_3)
    extrude(amount=-F5_DEPTH)

    # F6: cut F1, F2
    add(f1.part, mode=Mode.SUBTRACT)
    add(f2.part, mode=Mode.SUBTRACT)


solid = Compound([f1.part, f2.part, f5.part, f5b.part, f5c.part, f5d.part])
